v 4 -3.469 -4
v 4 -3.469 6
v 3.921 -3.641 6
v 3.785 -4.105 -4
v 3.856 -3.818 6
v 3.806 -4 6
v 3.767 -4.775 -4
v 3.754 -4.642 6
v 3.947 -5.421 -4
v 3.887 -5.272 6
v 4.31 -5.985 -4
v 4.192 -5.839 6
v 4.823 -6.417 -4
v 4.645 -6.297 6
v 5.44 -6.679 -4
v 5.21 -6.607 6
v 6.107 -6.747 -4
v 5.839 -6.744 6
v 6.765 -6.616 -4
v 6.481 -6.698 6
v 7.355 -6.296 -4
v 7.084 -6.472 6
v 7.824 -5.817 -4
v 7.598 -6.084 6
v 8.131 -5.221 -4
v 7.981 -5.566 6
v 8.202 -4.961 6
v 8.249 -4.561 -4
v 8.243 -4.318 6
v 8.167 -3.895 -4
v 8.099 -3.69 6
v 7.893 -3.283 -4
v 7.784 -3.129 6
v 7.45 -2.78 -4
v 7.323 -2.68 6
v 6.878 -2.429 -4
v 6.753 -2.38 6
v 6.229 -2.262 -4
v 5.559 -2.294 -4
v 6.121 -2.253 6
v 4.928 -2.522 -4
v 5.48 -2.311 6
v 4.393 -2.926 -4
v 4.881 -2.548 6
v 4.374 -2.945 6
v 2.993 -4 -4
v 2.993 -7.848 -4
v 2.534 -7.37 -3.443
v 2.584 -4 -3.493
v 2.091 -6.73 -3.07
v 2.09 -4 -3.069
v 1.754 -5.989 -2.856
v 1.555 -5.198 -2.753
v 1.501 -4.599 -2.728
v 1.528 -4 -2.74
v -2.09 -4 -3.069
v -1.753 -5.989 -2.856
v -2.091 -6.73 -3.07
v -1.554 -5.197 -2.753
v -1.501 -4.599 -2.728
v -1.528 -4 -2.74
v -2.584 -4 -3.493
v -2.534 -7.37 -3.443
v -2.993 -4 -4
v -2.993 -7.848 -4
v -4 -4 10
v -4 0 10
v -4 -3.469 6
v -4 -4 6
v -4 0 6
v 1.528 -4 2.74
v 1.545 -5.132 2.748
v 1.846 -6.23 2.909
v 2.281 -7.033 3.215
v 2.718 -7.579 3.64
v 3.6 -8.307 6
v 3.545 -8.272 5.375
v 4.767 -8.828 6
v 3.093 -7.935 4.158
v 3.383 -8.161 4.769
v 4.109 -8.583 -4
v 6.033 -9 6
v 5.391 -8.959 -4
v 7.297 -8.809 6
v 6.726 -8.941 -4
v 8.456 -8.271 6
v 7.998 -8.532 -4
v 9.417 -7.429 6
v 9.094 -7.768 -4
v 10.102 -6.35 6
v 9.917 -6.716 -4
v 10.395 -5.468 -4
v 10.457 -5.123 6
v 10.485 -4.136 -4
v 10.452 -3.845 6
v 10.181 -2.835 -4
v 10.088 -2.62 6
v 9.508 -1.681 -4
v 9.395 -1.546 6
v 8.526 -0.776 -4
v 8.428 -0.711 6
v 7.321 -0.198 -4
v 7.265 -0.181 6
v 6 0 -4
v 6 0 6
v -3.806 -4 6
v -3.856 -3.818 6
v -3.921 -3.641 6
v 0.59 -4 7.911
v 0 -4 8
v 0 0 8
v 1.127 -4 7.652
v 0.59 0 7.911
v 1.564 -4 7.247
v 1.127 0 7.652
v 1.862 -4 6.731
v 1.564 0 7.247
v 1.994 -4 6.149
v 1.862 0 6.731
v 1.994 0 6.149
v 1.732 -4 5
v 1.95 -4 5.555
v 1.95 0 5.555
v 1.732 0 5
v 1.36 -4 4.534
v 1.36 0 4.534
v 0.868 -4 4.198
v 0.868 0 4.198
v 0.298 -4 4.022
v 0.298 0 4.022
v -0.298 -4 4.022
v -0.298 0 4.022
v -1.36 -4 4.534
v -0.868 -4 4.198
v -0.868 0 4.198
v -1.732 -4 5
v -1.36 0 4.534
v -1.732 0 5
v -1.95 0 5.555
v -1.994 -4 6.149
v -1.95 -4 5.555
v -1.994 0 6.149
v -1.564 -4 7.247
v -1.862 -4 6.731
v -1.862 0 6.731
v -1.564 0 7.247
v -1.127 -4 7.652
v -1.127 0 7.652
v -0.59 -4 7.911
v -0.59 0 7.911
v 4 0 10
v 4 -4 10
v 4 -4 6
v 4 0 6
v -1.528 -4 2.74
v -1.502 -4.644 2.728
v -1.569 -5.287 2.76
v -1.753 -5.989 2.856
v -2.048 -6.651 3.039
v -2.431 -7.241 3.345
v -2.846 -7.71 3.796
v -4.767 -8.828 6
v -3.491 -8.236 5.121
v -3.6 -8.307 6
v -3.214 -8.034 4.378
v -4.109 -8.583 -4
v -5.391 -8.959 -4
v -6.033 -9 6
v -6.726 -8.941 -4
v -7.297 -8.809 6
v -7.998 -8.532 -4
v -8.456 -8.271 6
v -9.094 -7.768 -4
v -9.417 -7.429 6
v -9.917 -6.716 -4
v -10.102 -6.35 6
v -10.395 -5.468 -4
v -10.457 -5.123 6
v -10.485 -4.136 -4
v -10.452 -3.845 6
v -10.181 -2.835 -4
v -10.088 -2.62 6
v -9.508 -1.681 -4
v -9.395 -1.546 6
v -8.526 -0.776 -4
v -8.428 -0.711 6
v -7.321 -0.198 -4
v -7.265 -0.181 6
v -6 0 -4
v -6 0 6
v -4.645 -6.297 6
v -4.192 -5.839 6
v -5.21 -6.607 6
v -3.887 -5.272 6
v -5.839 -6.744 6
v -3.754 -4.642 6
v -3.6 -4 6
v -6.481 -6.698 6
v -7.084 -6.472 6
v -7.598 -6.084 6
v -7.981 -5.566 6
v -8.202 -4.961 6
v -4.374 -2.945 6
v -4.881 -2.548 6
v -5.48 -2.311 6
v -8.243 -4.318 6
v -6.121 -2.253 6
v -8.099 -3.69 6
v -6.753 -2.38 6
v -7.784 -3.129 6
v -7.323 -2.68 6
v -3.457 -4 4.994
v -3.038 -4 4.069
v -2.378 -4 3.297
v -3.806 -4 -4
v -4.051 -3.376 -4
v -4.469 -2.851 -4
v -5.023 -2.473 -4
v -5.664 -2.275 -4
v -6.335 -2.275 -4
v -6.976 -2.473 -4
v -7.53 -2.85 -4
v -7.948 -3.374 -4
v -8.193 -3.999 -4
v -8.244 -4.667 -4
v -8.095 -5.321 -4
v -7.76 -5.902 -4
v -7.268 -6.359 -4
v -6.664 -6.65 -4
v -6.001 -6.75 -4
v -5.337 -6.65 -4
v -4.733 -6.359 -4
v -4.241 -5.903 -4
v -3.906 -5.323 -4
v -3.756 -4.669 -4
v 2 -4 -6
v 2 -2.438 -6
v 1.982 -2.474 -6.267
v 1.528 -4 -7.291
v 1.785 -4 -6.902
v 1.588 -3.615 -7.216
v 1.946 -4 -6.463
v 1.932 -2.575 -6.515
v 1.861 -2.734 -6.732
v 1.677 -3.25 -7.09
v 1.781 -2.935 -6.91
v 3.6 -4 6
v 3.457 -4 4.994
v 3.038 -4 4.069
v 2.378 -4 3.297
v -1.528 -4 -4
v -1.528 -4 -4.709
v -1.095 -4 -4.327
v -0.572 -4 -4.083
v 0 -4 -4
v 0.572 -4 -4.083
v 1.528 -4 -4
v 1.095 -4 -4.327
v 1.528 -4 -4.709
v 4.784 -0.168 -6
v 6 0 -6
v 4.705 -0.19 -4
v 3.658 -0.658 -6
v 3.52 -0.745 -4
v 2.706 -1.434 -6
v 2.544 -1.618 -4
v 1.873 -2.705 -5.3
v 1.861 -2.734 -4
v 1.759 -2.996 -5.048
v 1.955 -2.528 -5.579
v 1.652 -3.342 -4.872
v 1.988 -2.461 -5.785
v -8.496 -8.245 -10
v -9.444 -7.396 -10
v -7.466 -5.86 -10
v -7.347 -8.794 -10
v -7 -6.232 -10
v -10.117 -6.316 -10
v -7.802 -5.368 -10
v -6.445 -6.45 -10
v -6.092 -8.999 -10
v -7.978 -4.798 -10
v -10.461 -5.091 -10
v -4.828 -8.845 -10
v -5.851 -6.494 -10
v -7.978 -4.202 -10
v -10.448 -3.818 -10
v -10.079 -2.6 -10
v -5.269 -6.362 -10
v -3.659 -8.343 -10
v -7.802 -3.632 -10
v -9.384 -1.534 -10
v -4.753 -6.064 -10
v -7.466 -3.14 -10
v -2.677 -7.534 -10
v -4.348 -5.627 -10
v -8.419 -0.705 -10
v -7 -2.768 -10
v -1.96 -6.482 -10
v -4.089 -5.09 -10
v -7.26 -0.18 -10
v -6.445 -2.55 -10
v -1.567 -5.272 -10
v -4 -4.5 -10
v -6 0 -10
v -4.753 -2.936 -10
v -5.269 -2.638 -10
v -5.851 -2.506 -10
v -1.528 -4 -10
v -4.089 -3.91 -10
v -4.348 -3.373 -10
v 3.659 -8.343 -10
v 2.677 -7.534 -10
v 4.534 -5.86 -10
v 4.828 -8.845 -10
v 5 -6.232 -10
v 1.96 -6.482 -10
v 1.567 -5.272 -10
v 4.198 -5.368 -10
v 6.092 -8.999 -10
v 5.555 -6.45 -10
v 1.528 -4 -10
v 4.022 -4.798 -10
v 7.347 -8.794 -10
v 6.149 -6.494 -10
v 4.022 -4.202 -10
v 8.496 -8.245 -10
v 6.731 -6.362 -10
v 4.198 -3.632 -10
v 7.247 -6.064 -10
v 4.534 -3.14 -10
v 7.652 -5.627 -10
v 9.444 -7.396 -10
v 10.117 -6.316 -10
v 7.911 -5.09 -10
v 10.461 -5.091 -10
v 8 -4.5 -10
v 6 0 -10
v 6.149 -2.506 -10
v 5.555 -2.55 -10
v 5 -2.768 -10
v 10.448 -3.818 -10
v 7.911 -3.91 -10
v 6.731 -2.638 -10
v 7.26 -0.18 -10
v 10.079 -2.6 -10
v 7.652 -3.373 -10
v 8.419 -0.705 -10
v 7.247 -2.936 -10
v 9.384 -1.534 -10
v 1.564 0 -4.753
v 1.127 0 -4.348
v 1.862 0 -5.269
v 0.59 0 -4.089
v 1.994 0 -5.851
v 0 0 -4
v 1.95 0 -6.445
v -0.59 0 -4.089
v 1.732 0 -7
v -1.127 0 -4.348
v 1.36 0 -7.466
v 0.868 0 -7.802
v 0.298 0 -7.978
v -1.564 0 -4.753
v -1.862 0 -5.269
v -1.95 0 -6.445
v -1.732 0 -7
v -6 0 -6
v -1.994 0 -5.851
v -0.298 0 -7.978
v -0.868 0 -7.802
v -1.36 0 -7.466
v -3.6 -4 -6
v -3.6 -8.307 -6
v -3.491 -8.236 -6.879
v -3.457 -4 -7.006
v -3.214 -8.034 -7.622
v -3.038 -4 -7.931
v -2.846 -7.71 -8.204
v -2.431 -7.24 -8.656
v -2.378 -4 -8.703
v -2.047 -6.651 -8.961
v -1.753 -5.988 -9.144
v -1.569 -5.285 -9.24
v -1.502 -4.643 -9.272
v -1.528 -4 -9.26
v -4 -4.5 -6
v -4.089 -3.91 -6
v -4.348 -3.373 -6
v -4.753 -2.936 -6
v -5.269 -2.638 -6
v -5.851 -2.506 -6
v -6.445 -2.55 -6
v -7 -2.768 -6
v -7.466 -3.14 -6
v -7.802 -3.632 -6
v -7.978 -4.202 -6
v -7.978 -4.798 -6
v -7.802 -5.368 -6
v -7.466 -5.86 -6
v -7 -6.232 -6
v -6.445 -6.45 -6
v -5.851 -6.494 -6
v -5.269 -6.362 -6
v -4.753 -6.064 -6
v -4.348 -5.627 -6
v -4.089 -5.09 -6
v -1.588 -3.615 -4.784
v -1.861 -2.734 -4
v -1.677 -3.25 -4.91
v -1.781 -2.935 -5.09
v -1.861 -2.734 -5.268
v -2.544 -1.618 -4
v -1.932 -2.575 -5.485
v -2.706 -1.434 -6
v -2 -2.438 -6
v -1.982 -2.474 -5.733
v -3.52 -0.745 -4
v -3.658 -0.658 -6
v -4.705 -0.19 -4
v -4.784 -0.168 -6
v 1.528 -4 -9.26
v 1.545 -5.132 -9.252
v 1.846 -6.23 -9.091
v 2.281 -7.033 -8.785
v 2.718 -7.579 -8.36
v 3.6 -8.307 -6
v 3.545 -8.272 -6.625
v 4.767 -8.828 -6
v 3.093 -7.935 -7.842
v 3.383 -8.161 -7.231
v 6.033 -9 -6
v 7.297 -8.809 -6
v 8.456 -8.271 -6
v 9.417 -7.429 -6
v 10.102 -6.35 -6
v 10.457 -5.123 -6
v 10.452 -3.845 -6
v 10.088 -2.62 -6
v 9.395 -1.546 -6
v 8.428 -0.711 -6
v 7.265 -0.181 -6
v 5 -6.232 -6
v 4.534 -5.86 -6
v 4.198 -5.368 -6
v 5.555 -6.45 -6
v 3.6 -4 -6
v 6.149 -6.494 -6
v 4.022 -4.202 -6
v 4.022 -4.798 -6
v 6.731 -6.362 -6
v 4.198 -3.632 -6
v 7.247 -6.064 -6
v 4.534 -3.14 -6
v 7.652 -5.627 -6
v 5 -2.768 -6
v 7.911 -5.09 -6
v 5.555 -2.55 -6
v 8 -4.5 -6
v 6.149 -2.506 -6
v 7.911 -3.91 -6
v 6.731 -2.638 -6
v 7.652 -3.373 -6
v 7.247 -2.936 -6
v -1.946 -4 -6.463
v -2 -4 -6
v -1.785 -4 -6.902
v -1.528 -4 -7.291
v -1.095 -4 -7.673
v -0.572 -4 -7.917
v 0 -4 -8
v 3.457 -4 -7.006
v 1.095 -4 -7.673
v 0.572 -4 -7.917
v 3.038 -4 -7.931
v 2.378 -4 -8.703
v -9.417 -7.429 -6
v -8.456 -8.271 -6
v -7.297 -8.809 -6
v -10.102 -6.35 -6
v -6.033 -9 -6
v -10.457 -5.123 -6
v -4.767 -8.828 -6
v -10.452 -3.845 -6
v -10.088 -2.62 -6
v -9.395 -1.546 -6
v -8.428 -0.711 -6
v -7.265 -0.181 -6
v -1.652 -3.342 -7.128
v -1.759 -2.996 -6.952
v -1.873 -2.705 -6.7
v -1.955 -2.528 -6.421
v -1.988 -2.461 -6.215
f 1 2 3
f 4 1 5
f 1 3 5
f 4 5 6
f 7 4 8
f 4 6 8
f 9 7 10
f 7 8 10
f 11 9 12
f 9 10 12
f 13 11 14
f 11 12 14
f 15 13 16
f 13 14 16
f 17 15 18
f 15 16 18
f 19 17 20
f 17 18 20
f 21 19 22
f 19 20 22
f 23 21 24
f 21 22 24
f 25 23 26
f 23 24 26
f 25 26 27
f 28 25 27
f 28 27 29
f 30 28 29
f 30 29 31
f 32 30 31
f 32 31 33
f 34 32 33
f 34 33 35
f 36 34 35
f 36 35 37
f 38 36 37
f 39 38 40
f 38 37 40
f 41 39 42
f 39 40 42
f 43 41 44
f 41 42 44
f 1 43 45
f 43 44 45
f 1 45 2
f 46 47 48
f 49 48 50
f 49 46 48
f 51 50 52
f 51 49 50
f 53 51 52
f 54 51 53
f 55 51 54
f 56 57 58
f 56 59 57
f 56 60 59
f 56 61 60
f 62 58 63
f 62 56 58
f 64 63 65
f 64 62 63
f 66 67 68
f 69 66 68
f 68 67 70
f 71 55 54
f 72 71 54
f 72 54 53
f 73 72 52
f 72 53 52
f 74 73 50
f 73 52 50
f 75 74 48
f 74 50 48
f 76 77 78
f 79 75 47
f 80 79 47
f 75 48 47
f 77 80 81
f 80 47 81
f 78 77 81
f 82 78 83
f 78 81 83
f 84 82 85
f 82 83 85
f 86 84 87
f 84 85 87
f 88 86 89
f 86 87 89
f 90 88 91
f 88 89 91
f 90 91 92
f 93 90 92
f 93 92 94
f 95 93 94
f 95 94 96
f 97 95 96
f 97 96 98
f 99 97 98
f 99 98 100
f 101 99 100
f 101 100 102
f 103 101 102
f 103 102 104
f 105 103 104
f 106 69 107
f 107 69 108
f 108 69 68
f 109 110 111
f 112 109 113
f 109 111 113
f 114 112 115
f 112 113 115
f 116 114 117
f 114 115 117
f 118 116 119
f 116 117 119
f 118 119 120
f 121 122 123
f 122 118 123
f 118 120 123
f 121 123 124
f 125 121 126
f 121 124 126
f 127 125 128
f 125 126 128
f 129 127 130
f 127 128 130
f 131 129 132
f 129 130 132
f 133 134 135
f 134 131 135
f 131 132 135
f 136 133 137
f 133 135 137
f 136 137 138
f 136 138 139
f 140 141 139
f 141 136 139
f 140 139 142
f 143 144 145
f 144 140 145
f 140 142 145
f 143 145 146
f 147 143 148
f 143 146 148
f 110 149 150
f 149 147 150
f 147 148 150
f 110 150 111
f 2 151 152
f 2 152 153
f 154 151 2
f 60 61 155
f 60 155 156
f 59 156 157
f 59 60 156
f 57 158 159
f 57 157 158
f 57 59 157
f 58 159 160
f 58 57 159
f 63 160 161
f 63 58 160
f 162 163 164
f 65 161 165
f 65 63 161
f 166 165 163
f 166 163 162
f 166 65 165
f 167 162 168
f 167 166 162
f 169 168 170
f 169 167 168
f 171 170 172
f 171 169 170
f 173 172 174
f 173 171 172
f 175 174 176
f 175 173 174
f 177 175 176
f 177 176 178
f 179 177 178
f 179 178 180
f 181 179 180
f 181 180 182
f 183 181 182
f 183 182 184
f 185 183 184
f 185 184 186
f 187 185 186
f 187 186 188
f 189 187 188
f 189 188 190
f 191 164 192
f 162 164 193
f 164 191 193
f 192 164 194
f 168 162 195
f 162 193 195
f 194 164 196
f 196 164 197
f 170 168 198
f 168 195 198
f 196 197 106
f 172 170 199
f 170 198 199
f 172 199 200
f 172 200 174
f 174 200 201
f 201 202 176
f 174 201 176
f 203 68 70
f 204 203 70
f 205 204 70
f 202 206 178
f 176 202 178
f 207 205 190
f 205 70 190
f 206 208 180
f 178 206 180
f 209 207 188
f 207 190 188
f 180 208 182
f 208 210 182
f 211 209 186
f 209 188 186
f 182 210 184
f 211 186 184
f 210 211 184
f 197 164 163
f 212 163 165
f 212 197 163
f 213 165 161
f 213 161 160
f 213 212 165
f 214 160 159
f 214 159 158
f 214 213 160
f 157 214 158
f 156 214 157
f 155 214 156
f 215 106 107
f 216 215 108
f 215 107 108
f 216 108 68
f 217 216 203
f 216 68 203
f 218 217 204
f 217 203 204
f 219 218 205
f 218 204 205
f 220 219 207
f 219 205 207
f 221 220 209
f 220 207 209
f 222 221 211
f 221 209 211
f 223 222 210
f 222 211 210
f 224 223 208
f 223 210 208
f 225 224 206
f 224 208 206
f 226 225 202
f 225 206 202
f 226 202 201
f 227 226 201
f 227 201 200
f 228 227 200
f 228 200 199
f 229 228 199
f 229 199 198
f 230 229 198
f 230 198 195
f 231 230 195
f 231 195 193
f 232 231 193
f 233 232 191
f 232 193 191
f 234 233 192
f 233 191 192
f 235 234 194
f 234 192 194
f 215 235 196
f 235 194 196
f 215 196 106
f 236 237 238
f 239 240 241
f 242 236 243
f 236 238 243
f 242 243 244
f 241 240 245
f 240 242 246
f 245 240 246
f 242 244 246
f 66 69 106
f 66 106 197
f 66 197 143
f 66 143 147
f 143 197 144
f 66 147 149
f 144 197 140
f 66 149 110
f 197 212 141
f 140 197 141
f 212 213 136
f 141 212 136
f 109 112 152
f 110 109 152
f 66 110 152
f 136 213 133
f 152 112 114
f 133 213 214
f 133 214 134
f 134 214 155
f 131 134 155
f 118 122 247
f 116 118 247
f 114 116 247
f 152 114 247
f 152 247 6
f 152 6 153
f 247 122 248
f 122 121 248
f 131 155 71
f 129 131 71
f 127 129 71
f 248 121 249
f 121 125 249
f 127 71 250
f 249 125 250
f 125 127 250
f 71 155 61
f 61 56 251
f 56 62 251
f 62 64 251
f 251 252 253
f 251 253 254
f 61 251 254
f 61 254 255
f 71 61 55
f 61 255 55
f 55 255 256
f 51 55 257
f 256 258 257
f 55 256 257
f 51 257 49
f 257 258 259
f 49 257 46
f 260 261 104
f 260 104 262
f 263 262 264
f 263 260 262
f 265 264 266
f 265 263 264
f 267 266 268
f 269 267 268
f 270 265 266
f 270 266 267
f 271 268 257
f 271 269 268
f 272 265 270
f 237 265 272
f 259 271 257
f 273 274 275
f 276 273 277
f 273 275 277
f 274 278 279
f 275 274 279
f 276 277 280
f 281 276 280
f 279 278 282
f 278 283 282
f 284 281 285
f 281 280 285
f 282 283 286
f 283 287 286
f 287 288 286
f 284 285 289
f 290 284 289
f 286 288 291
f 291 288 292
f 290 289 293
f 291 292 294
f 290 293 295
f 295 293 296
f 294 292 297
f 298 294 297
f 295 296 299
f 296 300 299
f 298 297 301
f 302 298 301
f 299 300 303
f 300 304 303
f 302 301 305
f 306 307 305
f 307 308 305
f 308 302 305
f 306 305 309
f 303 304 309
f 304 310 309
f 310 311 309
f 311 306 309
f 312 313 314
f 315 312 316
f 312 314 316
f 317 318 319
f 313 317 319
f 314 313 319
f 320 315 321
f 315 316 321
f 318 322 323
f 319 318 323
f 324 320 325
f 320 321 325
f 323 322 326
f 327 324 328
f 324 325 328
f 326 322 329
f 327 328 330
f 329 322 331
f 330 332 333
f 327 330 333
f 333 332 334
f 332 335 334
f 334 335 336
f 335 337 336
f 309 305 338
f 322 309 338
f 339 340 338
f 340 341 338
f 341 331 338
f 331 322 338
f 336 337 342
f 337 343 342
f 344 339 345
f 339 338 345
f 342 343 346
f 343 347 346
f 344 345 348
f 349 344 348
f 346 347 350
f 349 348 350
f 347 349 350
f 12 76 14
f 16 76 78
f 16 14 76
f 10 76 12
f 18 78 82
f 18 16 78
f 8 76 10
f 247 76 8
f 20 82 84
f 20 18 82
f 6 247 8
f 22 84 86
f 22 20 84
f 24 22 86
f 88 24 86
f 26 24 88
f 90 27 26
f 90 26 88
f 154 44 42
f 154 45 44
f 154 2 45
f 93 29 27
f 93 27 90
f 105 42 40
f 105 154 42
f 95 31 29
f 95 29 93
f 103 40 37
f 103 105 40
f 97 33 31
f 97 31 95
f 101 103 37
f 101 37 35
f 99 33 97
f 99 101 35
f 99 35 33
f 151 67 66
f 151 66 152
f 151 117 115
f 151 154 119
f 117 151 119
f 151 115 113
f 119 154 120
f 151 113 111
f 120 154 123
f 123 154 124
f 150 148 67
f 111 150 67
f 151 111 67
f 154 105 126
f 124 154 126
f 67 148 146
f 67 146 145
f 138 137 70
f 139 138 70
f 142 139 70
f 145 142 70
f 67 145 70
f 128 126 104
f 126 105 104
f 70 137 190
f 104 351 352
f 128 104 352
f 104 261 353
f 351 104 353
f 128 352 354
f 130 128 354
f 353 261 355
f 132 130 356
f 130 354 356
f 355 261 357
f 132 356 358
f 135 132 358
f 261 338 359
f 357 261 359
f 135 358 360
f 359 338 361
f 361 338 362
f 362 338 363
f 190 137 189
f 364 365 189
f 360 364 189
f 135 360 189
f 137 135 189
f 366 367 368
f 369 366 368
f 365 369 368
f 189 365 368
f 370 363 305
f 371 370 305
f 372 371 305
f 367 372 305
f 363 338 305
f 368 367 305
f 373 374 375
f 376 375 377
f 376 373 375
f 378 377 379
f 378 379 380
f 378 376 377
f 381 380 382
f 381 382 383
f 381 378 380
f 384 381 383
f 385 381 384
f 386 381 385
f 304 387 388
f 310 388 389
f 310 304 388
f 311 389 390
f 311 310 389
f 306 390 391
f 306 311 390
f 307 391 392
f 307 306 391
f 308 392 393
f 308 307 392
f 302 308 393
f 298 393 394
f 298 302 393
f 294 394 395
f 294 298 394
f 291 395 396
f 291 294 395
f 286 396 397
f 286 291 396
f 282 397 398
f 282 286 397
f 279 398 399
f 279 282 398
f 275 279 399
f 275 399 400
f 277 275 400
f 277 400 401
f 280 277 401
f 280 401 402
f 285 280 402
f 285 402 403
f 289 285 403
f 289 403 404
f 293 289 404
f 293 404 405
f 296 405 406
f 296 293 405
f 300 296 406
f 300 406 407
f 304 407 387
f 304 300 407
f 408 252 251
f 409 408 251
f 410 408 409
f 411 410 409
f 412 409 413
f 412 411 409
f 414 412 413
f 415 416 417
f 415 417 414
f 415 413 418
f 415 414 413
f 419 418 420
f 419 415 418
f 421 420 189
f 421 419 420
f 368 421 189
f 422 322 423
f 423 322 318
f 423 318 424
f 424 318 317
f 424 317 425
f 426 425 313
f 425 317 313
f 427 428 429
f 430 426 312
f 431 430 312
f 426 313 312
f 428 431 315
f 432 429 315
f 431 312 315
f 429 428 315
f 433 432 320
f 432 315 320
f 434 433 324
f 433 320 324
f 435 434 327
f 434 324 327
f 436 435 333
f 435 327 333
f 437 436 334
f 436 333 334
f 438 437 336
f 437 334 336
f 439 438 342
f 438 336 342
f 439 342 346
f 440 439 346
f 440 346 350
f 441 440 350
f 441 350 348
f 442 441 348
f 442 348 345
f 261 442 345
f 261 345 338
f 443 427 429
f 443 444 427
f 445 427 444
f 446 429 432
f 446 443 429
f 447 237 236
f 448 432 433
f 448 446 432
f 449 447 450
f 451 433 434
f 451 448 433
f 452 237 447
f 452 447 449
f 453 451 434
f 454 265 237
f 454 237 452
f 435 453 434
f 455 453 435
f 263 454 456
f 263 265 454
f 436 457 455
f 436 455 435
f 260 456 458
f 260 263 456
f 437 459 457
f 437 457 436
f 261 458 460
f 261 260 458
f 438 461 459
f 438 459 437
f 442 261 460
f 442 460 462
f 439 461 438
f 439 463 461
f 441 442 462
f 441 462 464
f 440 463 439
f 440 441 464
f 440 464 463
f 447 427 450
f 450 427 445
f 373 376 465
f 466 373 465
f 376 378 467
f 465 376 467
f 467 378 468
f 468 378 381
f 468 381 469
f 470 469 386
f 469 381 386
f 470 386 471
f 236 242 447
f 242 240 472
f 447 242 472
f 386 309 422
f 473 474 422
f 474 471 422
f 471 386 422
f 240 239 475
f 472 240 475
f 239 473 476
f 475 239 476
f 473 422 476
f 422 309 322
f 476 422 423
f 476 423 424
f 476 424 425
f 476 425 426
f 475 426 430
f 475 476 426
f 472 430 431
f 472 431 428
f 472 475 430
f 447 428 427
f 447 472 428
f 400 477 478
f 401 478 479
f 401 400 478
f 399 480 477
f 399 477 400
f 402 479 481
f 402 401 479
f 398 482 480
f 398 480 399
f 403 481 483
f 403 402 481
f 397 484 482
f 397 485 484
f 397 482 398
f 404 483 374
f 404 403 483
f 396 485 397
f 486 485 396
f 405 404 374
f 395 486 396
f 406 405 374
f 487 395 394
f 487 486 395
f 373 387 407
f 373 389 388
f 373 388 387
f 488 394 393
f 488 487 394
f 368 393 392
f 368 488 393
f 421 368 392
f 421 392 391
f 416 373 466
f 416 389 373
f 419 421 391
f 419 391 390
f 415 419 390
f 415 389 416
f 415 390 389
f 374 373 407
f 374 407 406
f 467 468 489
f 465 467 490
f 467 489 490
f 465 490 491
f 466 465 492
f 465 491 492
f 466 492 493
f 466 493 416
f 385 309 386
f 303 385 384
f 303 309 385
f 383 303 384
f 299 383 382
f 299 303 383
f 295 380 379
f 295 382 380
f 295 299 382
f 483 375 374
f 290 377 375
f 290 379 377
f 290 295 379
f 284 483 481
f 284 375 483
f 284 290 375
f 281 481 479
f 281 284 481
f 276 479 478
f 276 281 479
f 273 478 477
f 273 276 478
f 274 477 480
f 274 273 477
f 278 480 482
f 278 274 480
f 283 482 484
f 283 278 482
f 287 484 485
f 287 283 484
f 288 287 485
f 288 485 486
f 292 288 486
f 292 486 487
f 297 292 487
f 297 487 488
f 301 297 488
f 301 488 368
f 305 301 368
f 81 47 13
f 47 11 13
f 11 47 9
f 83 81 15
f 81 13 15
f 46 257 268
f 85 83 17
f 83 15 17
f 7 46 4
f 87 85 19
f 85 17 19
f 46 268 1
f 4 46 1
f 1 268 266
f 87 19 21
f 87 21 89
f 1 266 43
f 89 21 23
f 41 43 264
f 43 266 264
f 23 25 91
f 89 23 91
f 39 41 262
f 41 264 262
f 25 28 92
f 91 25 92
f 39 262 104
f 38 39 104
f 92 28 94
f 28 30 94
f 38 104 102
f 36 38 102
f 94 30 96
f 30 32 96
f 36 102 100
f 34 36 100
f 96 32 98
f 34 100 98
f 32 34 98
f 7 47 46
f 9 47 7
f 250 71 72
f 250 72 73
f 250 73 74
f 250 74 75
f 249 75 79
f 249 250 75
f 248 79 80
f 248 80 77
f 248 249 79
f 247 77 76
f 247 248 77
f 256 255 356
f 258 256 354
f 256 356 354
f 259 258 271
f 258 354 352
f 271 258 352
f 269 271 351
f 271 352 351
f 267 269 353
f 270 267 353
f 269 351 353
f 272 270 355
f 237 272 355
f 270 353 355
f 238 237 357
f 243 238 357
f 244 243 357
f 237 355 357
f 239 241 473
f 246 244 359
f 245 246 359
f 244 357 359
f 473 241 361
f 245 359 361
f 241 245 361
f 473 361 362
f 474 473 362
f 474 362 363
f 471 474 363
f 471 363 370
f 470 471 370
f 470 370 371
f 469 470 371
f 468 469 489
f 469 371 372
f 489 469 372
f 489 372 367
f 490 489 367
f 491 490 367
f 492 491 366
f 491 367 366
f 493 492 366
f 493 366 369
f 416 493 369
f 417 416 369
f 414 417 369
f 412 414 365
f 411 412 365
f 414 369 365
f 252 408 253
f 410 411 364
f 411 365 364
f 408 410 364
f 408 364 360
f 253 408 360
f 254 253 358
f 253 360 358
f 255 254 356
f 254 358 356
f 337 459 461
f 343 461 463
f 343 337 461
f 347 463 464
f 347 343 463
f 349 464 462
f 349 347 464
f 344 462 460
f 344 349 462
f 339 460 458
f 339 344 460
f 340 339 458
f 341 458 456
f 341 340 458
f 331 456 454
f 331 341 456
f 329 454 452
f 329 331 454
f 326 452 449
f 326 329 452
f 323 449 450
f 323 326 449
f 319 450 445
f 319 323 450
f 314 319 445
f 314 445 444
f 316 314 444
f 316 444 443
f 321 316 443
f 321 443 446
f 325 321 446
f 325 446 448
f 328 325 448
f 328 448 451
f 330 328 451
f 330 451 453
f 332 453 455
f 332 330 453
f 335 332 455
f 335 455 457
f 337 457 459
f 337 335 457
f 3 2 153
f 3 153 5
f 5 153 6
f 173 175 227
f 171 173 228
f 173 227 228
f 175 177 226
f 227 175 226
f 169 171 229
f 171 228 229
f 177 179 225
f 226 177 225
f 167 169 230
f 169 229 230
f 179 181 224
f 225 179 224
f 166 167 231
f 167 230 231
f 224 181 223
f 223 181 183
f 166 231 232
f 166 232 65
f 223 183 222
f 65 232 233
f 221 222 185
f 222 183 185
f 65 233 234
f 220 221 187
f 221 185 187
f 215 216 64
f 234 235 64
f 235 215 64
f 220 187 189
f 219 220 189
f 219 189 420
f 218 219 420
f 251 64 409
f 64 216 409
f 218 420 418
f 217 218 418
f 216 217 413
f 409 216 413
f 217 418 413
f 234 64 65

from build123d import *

# Parameters (mm, degrees)
SKETCH2_W           = 8
SKETCH2_H           = 20
SKETCH2_R           = 2
BOSS_EXTRUDE2_DEPTH = 4
SKETCH3_R           = 2
BOSS_EXTRUDE3_DEPTH = 16
SKETCH5_R           = 2.25
CUT_EXTRUDE1_DEPTH  = 10
CUT_EXTRUDE2_START  = -2
SKETCH6_R           = 4.5
CUT_EXTRUDE2_DEPTH  = 2
SKETCH7_R           = 3.6
CUT_EXTRUDE3_DEPTH  = 16.337861816
SKETCH8_R           = 2
CUT_EXTRUDE4_DEPTH  = 18.066048339


with BuildPart() as part:
    # Sketch2 → Boss-Extrude2 (new body)
    with BuildSketch(Plane(origin=(0, 0, 0), x_dir=(1, 0, 0), z_dir=(0, 1, 0))):
        Rectangle(SKETCH2_W, SKETCH2_H)
        with Locations(Location((0, 6, 0), (0, 0, 270))):
            Circle(SKETCH2_R, mode=Mode.SUBTRACT)
        with Locations(Location((0, -6, 0), (0, 0, 270))):
            Circle(SKETCH2_R, mode=Mode.SUBTRACT)
    extrude(amount=-BOSS_EXTRUDE2_DEPTH)

    # Sketch3 → Boss-Extrude3 (add)
    # profile 1 of 2: a face of its own
    with BuildSketch(Plane.XY.offset(-10)):
        with BuildLine():
            Line((6, 0), (4, 0))
            Line((4, 0), (4, -0.468871126))
            ThreePointArc((4, -0.468871126), (7.027112473, -8.88121444), (6, 0))
        make_face()
        with Locations((6, -4.5)):
            Circle(SKETCH3_R, mode=Mode.SUBTRACT)
    # profile 2 of 2: a face of its own
    with BuildSketch(Plane.XY.offset(-10)):
        with BuildLine():
            Line((-6, 0), (-4, 0))
            Line((-4, 0), (-4, -0.468871126))
            ThreePointArc((-4, -0.468871126), (-7.027112473, -8.88121444), (-6, 0))
        make_face()
        with Locations((-6, -4.5)):
            Circle(SKETCH3_R, mode=Mode.SUBTRACT)
    extrude(amount=BOSS_EXTRUDE3_DEPTH)

    # Sketch5 → Cut-Extrude1 (cut)
    with BuildSketch(Plane.XY.offset(6)):
        with Locations(Location((-6, -4.5, 0), (0, 0, 12.839588407))):
            Circle(SKETCH5_R)
        with Locations(Location((6, -4.5, 0), (0, 0, 152.733955549))):
            Circle(SKETCH5_R)
    extrude(amount=-CUT_EXTRUDE1_DEPTH, mode=Mode.SUBTRACT)

    # Sketch6 → Cut-Extrude2 (cut)
    with BuildSketch(Plane.XY.offset(-4).offset(CUT_EXTRUDE2_START)):
        with Locations((6, -4.5)):
            Circle(SKETCH6_R)
        with Locations((-6, -4.5)):
            Circle(SKETCH6_R)
    extrude(amount=CUT_EXTRUDE2_DEPTH, mode=Mode.SUBTRACT)

    # Sketch7 → Cut-Extrude3 (cut, through all)
    with BuildSketch(Plane.XZ.offset(4)):
        with Locations((0, 6)):
            Circle(SKETCH7_R)
        with Locations((0, -6)):
            Circle(SKETCH7_R)
    extrude(amount=CUT_EXTRUDE3_DEPTH, mode=Mode.SUBTRACT)

    # Sketch8 → Cut-Extrude4 (cut, through all)
    with BuildSketch(Plane(origin=(0, 0, 0), x_dir=(1, 0, 0), z_dir=(0, 1, 0))):
        with Locations(Location((0, 6, 0), (0, 0, 270))):
            Circle(SKETCH8_R)
        with Locations(Location((0, -6, 0), (0, 0, 270))):
            Circle(SKETCH8_R)
    extrude(amount=-CUT_EXTRUDE4_DEPTH, mode=Mode.SUBTRACT)


solid = part.part
